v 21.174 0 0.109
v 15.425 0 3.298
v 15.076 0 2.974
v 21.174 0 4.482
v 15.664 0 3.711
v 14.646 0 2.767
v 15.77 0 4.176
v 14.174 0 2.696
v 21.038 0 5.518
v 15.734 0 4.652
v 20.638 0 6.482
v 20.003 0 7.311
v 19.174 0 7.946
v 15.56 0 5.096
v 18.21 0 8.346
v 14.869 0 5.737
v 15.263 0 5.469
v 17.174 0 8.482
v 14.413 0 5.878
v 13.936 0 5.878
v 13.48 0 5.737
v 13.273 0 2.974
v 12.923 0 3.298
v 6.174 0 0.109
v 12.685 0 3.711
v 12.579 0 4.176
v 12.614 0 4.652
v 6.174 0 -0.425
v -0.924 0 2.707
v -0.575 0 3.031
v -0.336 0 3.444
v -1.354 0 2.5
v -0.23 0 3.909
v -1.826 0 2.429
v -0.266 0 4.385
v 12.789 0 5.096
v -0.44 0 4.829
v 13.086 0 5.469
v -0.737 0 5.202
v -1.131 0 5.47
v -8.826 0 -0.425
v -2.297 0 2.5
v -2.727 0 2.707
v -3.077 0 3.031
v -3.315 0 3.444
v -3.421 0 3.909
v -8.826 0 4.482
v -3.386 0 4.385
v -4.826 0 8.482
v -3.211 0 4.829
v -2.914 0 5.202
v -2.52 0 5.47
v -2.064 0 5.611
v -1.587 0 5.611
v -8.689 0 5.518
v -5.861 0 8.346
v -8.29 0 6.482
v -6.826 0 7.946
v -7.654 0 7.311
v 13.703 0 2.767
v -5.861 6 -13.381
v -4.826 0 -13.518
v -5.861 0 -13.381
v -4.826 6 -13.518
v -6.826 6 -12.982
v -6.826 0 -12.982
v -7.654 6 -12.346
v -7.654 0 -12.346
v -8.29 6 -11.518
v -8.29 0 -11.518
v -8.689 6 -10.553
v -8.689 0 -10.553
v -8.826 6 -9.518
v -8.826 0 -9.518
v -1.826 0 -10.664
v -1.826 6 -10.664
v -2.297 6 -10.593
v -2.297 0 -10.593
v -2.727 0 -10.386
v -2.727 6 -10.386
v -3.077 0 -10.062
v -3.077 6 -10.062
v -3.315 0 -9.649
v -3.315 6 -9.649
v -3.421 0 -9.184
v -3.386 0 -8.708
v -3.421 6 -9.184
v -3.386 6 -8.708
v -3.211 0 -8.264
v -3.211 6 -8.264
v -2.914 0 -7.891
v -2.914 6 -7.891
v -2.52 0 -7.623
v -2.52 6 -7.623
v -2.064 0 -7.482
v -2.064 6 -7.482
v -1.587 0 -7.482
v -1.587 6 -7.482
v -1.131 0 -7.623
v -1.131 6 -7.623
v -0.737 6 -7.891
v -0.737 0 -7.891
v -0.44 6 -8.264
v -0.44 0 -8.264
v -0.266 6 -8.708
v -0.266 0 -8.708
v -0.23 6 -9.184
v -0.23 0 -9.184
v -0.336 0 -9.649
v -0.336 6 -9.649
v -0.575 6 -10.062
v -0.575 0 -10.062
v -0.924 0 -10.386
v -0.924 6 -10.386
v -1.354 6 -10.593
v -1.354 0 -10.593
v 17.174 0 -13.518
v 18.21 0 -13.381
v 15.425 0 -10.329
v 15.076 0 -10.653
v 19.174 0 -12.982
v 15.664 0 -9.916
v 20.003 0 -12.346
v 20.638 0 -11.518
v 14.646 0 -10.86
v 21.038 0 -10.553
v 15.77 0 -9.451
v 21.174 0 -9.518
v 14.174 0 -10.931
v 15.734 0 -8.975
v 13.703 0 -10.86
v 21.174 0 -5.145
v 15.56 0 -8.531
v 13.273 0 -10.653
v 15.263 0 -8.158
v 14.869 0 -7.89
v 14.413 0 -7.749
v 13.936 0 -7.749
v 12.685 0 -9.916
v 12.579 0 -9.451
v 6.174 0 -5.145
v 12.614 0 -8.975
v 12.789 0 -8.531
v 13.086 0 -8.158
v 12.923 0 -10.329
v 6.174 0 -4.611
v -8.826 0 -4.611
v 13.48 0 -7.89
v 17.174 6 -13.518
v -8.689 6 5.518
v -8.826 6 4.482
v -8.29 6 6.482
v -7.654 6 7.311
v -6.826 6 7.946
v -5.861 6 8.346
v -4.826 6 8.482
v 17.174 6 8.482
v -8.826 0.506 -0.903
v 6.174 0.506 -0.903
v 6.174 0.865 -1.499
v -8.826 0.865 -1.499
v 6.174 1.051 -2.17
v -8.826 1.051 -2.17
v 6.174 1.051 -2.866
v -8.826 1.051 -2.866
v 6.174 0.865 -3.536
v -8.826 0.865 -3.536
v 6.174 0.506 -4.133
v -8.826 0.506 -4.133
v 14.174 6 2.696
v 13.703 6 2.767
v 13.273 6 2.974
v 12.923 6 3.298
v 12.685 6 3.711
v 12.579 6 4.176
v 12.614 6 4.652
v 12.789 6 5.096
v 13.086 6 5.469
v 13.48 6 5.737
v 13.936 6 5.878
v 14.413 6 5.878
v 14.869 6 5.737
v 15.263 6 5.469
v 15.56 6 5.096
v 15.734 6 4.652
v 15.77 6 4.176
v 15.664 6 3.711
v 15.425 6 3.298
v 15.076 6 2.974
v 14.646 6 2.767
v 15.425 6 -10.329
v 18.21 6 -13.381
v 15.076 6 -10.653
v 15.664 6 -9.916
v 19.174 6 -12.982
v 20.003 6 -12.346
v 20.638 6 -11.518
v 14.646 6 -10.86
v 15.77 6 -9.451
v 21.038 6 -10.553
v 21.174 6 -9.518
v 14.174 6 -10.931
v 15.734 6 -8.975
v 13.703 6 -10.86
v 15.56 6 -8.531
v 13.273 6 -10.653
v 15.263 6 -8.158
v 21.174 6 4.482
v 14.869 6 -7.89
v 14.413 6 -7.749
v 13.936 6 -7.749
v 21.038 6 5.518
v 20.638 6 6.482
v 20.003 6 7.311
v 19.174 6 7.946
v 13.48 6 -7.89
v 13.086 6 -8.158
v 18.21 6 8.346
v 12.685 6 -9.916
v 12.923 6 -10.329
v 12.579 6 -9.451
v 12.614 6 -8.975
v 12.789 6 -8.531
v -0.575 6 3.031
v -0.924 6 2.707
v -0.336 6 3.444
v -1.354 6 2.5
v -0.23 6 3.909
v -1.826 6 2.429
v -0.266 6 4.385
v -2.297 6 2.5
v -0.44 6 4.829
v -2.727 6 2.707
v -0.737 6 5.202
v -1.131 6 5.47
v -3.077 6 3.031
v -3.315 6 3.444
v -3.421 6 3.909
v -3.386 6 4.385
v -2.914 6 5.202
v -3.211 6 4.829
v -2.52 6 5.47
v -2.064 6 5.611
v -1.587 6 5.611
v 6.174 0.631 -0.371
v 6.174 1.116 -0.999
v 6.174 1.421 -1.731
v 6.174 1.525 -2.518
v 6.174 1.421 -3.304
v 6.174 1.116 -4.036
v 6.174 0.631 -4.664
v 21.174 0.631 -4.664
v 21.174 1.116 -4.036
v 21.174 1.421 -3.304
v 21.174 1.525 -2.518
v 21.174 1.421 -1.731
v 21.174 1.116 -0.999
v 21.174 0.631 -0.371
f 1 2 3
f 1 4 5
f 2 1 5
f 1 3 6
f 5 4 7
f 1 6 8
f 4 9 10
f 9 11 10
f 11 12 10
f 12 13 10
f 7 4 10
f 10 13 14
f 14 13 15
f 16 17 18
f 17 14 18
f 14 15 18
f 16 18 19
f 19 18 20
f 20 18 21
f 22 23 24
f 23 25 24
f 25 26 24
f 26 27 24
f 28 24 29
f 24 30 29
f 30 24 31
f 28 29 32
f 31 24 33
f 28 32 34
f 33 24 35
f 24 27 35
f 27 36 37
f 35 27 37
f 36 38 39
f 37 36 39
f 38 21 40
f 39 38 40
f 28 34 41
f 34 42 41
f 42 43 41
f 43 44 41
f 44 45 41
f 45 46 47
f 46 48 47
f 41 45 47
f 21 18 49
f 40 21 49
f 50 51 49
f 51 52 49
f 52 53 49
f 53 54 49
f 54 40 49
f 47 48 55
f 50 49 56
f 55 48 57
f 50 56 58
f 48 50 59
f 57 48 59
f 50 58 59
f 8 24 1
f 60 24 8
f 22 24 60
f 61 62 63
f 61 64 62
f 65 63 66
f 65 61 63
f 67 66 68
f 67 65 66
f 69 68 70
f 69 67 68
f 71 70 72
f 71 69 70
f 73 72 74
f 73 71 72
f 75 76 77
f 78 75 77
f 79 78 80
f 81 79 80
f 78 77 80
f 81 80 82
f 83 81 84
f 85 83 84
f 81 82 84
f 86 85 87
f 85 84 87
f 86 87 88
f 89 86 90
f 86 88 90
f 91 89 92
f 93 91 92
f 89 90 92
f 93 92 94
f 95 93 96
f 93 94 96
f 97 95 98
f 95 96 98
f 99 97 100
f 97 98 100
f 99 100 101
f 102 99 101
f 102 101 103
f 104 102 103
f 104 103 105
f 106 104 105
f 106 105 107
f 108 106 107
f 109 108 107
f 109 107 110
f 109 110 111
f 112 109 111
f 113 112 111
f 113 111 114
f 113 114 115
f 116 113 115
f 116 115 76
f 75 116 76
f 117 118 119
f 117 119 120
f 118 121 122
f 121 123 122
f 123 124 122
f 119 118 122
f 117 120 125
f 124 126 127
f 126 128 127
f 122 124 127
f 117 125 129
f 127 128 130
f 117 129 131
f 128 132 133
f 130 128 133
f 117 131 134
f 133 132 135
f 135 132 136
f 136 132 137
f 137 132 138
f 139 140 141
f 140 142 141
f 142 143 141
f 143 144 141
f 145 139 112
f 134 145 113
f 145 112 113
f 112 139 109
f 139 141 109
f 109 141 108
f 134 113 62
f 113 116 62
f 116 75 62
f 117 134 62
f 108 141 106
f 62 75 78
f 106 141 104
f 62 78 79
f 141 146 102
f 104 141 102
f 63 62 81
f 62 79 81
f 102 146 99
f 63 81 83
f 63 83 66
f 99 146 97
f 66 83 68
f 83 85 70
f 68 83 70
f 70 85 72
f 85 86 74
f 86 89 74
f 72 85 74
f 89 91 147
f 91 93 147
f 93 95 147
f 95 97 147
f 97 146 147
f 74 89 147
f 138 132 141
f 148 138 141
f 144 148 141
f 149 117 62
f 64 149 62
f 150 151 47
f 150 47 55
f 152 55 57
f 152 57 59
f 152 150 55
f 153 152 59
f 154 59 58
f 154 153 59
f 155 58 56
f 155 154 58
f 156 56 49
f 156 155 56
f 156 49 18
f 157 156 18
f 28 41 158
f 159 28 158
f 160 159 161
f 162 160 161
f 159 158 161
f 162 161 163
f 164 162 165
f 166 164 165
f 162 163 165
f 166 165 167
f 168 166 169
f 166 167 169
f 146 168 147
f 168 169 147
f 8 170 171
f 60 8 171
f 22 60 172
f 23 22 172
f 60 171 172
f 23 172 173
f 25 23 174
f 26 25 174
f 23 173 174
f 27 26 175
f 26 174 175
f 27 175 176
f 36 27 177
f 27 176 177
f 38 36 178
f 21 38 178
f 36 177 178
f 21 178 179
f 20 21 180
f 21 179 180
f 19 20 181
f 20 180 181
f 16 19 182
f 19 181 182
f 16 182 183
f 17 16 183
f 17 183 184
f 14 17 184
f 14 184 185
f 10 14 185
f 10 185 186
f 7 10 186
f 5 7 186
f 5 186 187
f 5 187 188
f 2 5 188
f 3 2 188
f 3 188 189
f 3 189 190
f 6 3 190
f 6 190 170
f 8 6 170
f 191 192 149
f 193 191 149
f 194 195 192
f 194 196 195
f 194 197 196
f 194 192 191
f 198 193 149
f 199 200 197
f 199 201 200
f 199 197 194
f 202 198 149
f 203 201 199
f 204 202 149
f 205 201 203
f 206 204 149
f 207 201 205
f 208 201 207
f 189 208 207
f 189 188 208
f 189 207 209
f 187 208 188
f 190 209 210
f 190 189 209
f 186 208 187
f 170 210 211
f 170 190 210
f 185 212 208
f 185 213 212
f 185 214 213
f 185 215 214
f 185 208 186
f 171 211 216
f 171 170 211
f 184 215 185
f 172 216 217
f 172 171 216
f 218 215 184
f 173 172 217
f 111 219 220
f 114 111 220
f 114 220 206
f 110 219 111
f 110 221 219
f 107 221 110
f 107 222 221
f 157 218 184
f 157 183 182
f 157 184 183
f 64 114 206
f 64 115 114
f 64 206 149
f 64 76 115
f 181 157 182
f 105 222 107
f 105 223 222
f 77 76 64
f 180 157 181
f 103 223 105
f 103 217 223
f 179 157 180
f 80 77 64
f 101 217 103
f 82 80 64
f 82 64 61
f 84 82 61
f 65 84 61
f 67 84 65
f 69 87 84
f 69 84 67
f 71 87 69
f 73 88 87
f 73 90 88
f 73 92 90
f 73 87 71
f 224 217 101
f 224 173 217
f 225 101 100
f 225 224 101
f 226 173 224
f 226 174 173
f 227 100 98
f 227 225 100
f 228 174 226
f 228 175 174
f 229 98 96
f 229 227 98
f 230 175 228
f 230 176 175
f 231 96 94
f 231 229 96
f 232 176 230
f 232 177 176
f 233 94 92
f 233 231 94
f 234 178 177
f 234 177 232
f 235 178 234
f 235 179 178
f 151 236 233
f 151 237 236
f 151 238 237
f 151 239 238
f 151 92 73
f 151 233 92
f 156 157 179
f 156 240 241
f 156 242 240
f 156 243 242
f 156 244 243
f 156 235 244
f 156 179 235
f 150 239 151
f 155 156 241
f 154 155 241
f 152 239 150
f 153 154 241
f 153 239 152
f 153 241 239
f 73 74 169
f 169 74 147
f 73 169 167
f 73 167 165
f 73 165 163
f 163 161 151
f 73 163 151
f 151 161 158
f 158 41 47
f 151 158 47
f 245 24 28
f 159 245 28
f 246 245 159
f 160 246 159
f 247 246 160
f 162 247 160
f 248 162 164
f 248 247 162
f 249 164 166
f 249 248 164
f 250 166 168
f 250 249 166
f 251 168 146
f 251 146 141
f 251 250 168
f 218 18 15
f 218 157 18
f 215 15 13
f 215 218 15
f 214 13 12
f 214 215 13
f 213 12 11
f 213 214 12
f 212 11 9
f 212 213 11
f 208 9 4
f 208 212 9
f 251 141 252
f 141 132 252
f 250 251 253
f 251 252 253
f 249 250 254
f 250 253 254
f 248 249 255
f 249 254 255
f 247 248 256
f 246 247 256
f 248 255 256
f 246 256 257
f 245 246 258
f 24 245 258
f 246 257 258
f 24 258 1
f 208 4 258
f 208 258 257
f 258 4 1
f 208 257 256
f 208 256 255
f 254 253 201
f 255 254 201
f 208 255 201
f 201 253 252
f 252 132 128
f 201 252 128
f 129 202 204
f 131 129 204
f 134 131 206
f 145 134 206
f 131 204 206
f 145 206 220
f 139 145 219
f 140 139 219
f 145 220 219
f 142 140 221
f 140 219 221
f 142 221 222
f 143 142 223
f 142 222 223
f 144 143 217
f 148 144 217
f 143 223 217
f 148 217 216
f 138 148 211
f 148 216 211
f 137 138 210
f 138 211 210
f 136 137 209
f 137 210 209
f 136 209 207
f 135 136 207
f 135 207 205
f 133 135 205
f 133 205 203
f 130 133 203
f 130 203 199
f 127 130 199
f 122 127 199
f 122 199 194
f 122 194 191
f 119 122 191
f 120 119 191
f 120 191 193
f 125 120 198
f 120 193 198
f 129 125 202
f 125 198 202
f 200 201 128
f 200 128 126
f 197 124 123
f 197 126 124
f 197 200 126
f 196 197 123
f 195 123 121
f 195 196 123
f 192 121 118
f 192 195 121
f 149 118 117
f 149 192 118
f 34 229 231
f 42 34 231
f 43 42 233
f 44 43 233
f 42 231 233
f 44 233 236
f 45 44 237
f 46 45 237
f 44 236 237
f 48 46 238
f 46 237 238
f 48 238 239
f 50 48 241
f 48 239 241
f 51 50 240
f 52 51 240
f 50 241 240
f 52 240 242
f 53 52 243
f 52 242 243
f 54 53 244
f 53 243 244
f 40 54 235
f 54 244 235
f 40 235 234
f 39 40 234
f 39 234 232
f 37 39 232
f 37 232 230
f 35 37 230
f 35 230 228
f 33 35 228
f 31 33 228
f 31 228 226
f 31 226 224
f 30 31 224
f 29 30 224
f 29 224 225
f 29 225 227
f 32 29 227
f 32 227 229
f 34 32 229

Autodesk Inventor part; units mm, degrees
ref_plane "YZ Plane" through (0, 0, 0) normal (1, 0, 0) x (0, 1, 0)
ref_plane "XZ Plane" through (0, 0, 0) normal (0, 1, 0) x (-1, 0, 0)
ref_plane "XY Plane" through (0, 0, 0) normal (0, 0, 1) x (1, 0, 0)
sketch "Sketch1" plane through (0, 0, 0) normal (0, 1, 0) x (-1, 0, 0)
  line L0 (8.8257, 8.4823) -> (-21.1743, 8.4823)
  line L1 (-21.1743, 8.4823) -> (-21.1743, -13.5177)
  line L2 (-21.1743, -13.5177) -> (8.8257, -13.5177)
  line L3 (8.8257, -13.5177) -> (8.8257, 8.4823)
  point P0 (0, 0)
  dimension "d0" = 30
  dimension "d1" = 22
extrude "Extrusion1" add sketch "Sketch1" along normal blind 6
fillet "Fillet1" radius 4 4 edges at (21.1743, 3, 8.4823) (21.1743, 3, -13.5177) (-8.8257, 3, -13.5177) (-8.8257, 3, 8.4823)
sketch "Sketch3" plane through (21.1743, 0, 4.4823) normal (1, 0, 0) x (0, 0, -1)
  line L0 (0, 0) -> (14, 0) projected
  line L1 (0, 6) -> (14, 6) projected
  line L2 (14, 6) -> (14, 0)
  line L3 (0, 0) -> (0, 6) projected
  line L4 (0, 0) -> (0, 6)
  line L5 (0, 6) -> (14, 6)
  arc A0 (9.6269, 0) -> (4.3731, 0) centre (7, -1.5) ccw
  dimension "d35" = 7
  dimension "d37" = 6.05
  dimension "d40" = 1.5
  dimension "d41" = 14
sketch "Sketch4" plane through (-8.8257, 0, -9.5177) normal (-1, 0, 0) x (0, 0, 1)
  line L0 (0, 0) -> (14, 0) projected
  line L1 (0, 0) -> (14, 0)
  line L2 (0, 6) -> (0, 0) projected
  line L3 (0, 0) -> (0, 6)
  line L4 (14, 6) -> (0, 6) projected
  line L5 (0, 6) -> (14, 6)
  line L6 (14, 0) -> (14, 6) projected
  line L7 (14, 6) -> (14, 0)
  arc A0 (9.093, 0) -> (4.907, 0) centre (7, -1.5) ccw
  dimension "d31" = 7
  dimension "d32" = 5.15
  dimension "d42" = 14
  dimension "d43" = 1.5
extrude "Extrusion5" cut sketch "Sketch4" against normal blind 15 contours A0 L0
extrude "Extrusion6" cut sketch "Sketch3" against normal blind 15 contours A0 L0
sketch "Szkic5" plane through (0, 0, 0) normal (0, -1, 0) x (1, 0, 0)
  line L0 (6.1743, 0.1092) -> (21.1743, 0.1092) projected
  line L1 (21.1743, 4.4823) -> (21.1743, 0.1092) projected
  arc A0 (21.1743, 4.4823) -> (17.1743, 8.4823) centre (17.1743, 4.4823) ccw projected
  line L2 (-4.8257, 8.4823) -> (17.1743, 8.4823) projected
  arc A1 (-4.8257, 8.4823) -> (-8.8257, 4.4823) centre (-4.8257, 4.4823) ccw projected
  line L3 (-8.8257, -0.4247) -> (-8.8257, 4.4823) projected
  line L4 (-8.8257, -0.4247) -> (6.1743, -0.4247) projected
  line L5 (6.1743, -0.4247) -> (6.1743, 0.1092) projected
  line L6 (21.1743, -5.1446) -> (6.1743, -5.1446) projected
  line L7 (6.1743, -5.1446) -> (6.1743, -4.6107) projected
  line L8 (6.1743, -4.6107) -> (-8.8257, -4.6107) projected
  line L9 (-8.8257, -9.5177) -> (-8.8257, -4.6107) projected
  arc A2 (-8.8257, -9.5177) -> (-4.8257, -13.5177) centre (-4.8257, -9.5177) ccw projected
  line L10 (17.1743, -13.5177) -> (-4.8257, -13.5177) projected
  arc A3 (17.1743, -13.5177) -> (21.1743, -9.5177) centre (17.1743, -9.5177) ccw projected
  line L11 (21.1743, -5.1446) -> (21.1743, -9.5177) projected
  point P0 (0, 0)
  point P1 (14.1743, 4.2958)
  point P2 (-1.8257, 4.0288)
  point P3 (14.1743, -9.3311)
  point P4 (-1.8257, -9.0642)
  dimension "d44" = 7
  dimension "d45" = 7
  dimension "d46" = 15
  dimension "d47" = 15
  dimension "d48" = 7
  dimension "d49" = 7
  dimension "d50" = 4.4535
  dimension "d51" = 4.4535
  dimension "d52" = 4.1866
  dimension "d53" = 4.1866
  dimension "d61" = 8.3731
  dimension "d62" = 8.907
hole "Otwór2" at (14.1743, 0, 4.2958) at (-1.8257, 0, 4.0288) at (14.1743, 0, -9.3311) at (-1.8257, 0, -9.0642) direction (0, 1, 0) diameter 3.2 end through all
equation "\"d35\" = 0.5 * d41"
equation "\"d31\" = 0.5 * d42"
equation "\"d45\" = d44"
equation "\"d49\" = d48"
equation "\"d50\" = 0.5 * d62"
equation "\"d51\" = d50"
equation "\"d52\" = 0.5 * d61"
equation "\"d53\" = d52"
properties part number "3DP_ABS_Z_Axis_Screw_Coupler"
